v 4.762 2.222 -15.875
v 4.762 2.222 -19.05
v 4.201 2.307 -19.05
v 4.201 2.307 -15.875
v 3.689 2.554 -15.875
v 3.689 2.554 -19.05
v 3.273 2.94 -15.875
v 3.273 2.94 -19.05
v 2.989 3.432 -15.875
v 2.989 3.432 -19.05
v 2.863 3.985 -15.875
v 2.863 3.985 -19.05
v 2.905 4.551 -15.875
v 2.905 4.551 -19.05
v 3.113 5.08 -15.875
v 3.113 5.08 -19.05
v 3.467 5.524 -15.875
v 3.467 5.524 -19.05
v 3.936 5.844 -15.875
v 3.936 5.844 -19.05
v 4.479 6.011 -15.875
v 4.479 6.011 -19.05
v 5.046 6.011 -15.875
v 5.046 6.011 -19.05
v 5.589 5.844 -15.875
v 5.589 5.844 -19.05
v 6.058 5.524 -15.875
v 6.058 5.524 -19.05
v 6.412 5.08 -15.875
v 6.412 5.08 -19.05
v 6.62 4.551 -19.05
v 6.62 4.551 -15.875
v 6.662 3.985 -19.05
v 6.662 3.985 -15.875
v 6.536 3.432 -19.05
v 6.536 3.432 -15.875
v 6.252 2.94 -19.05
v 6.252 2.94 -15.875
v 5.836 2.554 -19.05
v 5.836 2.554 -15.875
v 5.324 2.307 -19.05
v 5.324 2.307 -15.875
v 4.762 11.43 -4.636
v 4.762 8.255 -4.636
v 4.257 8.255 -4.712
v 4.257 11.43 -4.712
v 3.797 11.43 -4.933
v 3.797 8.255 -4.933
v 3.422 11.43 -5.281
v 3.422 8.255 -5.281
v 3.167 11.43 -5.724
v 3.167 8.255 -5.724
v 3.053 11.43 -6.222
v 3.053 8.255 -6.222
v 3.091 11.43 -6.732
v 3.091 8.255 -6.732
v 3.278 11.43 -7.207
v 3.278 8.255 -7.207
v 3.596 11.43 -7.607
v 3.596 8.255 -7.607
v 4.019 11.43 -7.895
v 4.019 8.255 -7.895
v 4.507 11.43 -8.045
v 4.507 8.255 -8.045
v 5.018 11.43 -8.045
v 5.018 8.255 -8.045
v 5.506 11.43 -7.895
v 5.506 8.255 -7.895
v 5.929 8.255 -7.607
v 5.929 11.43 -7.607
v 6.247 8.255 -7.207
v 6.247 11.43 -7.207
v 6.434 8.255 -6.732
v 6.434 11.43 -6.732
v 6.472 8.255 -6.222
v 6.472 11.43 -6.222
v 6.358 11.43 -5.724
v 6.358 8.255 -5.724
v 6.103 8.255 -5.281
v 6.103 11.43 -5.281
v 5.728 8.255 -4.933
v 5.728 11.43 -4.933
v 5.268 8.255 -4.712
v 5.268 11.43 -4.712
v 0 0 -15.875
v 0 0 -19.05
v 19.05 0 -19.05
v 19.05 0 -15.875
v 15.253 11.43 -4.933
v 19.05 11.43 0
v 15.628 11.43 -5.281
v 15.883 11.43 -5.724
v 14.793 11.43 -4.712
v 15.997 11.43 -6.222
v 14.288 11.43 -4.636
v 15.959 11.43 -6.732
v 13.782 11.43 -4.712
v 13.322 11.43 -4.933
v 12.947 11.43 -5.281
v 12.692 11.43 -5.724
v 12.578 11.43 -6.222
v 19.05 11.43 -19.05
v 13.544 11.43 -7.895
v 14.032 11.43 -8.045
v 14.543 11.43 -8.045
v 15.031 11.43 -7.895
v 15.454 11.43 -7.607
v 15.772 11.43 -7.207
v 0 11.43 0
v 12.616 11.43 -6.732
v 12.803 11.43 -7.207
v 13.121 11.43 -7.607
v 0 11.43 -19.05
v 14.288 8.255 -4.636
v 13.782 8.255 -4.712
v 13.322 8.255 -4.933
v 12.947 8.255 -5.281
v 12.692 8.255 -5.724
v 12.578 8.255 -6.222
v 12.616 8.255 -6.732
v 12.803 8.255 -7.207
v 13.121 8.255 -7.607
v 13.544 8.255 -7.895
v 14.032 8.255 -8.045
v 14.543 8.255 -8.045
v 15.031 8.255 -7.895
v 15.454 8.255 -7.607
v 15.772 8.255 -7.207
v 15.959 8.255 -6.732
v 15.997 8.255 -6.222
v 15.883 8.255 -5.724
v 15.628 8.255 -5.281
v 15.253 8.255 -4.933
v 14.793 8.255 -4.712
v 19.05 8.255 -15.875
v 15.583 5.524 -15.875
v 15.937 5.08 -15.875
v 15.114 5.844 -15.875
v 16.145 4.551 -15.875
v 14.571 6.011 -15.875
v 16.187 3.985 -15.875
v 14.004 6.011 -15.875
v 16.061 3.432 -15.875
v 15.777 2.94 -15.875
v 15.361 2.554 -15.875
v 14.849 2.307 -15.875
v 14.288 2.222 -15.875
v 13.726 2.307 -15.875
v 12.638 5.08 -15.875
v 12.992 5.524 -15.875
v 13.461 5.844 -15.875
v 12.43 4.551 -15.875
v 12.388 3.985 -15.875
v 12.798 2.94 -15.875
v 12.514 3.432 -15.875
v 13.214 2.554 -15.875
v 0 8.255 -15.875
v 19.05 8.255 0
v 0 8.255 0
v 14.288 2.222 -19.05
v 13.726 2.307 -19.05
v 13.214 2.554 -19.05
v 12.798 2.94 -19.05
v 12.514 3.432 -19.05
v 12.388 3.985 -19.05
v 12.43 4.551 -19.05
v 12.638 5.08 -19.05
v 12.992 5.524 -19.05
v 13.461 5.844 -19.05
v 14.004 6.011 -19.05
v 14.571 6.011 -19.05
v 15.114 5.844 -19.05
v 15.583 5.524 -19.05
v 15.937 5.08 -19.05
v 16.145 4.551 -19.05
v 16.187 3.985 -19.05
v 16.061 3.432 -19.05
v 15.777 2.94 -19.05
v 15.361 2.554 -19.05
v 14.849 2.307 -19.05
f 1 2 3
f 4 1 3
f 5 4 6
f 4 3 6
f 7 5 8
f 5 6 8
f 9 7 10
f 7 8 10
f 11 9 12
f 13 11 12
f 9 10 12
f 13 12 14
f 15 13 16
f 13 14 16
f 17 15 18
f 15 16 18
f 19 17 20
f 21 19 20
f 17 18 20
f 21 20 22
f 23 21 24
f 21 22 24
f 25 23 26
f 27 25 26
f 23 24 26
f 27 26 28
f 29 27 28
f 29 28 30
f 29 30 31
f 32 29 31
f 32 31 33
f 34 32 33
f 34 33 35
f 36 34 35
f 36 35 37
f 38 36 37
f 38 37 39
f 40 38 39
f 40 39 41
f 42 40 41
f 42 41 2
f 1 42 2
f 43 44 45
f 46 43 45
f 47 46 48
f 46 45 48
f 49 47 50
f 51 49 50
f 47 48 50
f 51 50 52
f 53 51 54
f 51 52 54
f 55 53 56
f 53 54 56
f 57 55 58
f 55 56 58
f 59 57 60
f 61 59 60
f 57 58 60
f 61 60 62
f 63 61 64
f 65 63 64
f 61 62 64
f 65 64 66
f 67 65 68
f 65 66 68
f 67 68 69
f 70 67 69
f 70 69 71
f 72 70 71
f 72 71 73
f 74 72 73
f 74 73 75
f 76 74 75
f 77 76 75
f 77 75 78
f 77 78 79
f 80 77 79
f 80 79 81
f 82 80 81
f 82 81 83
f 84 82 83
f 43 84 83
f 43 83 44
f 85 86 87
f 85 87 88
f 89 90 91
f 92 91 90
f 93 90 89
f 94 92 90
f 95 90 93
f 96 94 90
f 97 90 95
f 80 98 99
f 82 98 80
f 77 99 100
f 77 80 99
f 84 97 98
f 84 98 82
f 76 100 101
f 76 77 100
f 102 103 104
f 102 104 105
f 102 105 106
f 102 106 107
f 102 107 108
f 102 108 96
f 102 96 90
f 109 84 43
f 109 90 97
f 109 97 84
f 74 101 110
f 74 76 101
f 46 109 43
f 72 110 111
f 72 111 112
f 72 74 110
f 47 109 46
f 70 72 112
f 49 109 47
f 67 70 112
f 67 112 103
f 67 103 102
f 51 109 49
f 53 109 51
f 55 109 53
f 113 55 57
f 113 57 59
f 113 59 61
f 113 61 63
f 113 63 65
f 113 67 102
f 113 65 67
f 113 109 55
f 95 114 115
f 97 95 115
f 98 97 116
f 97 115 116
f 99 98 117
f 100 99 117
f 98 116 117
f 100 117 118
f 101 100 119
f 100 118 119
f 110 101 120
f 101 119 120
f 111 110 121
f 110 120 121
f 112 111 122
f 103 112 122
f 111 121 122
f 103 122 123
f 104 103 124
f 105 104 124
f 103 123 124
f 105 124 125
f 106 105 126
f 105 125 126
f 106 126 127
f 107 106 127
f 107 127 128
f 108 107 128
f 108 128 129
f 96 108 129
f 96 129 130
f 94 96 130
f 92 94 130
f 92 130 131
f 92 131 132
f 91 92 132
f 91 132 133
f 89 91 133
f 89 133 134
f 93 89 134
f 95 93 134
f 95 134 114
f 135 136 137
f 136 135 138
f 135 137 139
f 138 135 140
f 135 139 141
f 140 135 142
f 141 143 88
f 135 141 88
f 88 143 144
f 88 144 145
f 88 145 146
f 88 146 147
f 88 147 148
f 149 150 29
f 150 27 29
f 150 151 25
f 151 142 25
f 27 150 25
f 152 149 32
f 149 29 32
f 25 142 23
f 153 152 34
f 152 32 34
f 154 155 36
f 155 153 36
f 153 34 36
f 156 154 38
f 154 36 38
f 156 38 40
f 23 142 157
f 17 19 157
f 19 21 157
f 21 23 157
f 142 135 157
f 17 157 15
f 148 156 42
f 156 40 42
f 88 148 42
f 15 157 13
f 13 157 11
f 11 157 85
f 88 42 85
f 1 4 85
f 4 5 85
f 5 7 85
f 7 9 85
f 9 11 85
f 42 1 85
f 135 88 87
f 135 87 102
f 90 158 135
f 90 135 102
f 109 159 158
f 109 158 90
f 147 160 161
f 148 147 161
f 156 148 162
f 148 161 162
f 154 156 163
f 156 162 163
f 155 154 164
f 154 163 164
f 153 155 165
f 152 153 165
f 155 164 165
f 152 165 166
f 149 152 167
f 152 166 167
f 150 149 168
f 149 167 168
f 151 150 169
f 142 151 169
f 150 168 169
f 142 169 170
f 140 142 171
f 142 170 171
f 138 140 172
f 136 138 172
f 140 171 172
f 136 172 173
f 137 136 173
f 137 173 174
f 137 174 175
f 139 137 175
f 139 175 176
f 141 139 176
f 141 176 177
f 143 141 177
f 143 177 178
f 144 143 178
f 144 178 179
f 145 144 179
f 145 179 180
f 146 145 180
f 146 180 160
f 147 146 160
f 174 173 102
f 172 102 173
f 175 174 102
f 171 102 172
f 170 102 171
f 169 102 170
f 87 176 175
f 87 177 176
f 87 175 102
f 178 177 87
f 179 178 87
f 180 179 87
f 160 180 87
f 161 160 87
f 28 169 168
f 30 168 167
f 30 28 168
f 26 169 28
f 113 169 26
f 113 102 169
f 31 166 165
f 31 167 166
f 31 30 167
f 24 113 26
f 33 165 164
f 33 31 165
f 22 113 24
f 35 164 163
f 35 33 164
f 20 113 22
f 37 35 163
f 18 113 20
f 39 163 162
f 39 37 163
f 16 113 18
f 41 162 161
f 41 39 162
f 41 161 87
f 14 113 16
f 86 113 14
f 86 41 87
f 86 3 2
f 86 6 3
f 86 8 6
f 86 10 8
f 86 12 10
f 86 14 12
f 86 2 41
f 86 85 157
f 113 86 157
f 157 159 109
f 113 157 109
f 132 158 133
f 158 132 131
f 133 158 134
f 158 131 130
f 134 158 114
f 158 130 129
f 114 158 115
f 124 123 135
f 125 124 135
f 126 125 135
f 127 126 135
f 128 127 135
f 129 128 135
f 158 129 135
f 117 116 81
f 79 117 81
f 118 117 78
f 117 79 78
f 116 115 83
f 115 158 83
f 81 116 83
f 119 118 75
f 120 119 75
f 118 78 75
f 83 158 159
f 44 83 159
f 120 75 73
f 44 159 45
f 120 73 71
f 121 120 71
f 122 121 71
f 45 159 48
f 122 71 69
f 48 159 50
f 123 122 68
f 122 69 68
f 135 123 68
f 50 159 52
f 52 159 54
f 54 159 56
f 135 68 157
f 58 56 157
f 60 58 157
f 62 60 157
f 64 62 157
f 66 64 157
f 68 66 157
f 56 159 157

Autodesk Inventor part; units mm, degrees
ref_plane "YZ Plane" through (0, 0, 0) normal (1, 0, 0) x (0, 1, 0)
ref_plane "XZ Plane" through (0, 0, 0) normal (0, 1, 0) x (-1, 0, 0)
ref_plane "XY Plane" through (0, 0, 0) normal (0, 0, 1) x (1, 0, 0)
sketch "Sketch1" plane through (0, 0, 0) normal (1, 0, 0) x (0, 1, 0)
  line L0 (0, 0) -> (11.43, 0)
  line L1 (11.43, 0) -> (11.43, -19.05)
  line L2 (11.43, -19.05) -> (0, -19.05)
  line L3 (0, -19.05) -> (0, 0)
  line L4 (0, 0) -> (8.255, 0)
  line L5 (8.255, 0) -> (8.255, -15.875)
  line L6 (8.255, -15.875) -> (0, -15.875)
  line L7 (0, -15.875) -> (0, 0)
  dimension "d0" = 11.43
  dimension "d1" = 19.05
  dimension "d2" = 8.255
  dimension "d3" = 15.875
extrude "Extrusion1" add sketch "Sketch1" along normal blind 19.05 contours L0 L1 L2 L3 L6 L5
sketch "Sketch2" plane through (0, 11.43, 0) normal (0, 1, 0) x (1, 0, 0)
  line L0 (0, 19.05) -> (0, 0) projected
  line L1 (0, 0) -> (19.05, 0) projected
  line L2 (19.05, 19.05) -> (19.05, 0) projected
  line L3 (0, 19.05) -> (19.05, 19.05) projected
  point P0 (0, 0)
  point P1 (4.7625, 6.35)
  point P2 (14.2875, 6.35)
  dimension "d6" = 9.525
  dimension "d7" = 4.7625
  dimension "d8" = 19.05
  dimension "d31" = 19.05
  dimension "d34" = 6.35
  dimension "d35" = 6.35
hole "Hole1" at (4.7625, 11.43, -6.35) at (14.2875, 11.43, -6.35) direction (0, -1, 0) diameter 3.429 end through all
sketch "Sketch3" plane through (0, 0, -15.875) normal (0, 0, 1) x (1, 0, 0)
  line L0 (0, 0) -> (0, 8.255) projected
  line L1 (19.05, 0) -> (0, 0) projected
  line L2 (19.05, 8.255) -> (19.05, 0) projected
  line L3 (0, 8.255) -> (19.05, 8.255) projected
  point P0 (0, 0)
  point P1 (4.7625, 4.1275)
  point P2 (14.2875, 4.1275)
  dimension "d20" = 9.525
  dimension "d21" = 4.7625
  dimension "d22" = 4.1275
  dimension "d23" = 4.1275
  dimension "d32" = 19.05
  dimension "d33" = 8.255
hole "Hole2" at (4.7625, 4.1275, -15.875) at (14.2875, 4.1275, -15.875) direction (0, 0, -1) diameter 3.81 end through all
equation "\"d7\" = -0.5 * d6 + 0.5 * d31"
equation "\"d21\" = -0.5 * d20 + 0.5 * d32"
equation "\"d22\" = 0.5 * d33"
equation "\"d23\" = d22"
properties part number "TensionerPlate4a" material "ABS Plastic"
